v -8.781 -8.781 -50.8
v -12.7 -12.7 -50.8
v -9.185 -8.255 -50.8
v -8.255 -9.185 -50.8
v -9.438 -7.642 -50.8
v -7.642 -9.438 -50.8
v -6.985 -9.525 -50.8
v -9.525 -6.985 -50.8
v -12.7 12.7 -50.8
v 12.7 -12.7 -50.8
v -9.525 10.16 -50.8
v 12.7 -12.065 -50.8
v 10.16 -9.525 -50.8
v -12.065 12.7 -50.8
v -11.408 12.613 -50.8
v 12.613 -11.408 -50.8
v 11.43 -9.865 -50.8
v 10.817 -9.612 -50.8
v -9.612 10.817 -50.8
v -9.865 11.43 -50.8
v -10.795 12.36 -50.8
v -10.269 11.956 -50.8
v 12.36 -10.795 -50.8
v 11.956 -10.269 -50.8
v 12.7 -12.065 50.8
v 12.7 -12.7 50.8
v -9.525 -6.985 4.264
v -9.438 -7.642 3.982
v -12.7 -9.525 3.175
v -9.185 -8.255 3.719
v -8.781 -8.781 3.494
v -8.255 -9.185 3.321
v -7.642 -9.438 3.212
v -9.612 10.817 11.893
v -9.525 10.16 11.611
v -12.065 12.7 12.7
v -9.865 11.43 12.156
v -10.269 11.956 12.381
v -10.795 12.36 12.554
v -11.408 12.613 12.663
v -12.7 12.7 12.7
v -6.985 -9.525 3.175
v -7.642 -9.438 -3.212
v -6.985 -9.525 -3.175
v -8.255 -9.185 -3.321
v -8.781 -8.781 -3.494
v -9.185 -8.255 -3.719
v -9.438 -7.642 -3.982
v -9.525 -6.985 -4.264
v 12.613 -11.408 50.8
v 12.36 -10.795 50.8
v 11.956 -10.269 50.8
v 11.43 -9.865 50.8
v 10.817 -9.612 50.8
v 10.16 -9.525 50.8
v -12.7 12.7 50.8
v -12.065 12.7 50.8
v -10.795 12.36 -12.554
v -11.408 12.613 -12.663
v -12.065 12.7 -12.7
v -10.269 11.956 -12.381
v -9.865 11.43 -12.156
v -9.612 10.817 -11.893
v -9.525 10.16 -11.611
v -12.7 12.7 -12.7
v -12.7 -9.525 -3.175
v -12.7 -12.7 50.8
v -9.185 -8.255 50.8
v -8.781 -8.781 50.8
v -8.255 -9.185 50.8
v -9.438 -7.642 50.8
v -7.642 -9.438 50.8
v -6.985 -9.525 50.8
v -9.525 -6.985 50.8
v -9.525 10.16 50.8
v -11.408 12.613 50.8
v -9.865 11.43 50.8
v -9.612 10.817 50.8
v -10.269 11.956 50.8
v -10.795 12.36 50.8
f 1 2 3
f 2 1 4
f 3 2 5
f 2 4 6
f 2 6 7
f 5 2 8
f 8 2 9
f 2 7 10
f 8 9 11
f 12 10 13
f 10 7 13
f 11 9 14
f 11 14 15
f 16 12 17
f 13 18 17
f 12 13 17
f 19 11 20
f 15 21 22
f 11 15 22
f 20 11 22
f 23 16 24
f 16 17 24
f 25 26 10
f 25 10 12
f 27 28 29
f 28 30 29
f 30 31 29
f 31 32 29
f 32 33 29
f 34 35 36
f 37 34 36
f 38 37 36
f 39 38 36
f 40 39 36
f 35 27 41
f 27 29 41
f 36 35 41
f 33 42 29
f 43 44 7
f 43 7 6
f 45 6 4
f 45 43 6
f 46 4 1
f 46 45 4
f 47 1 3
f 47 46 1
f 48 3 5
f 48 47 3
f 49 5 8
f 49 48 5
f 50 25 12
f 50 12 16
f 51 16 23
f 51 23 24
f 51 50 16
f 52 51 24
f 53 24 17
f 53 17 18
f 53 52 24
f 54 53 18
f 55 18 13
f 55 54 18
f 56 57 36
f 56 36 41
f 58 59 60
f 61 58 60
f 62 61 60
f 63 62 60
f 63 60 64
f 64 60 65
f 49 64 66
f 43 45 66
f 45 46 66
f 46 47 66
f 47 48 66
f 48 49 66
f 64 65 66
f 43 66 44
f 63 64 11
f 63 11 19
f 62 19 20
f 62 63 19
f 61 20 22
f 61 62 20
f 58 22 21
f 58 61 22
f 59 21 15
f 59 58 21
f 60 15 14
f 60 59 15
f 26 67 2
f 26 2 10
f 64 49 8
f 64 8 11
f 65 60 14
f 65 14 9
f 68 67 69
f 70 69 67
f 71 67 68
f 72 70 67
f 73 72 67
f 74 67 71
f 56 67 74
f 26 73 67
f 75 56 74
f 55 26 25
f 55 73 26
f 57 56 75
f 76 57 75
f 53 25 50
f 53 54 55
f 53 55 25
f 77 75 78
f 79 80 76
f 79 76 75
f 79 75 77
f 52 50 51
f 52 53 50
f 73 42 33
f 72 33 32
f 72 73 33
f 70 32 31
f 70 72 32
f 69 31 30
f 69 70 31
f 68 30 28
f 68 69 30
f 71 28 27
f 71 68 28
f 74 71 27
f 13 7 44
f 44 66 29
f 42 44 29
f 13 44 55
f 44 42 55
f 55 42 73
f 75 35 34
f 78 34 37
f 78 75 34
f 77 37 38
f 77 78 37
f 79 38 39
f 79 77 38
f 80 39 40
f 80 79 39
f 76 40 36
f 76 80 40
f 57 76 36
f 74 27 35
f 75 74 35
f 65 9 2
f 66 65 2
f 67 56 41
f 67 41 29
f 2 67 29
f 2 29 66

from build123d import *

# Parameters (mm, degrees)
BOSS_EXTRUDE1_DEPTH = 50.8
CUT_EXTRUDE1_DEPTH  = 59.198711326


with BuildPart() as part:
    # Sketch1 → Boss-Extrude1 (new, symmetric)
    with BuildSketch(Plane.XY):
        with BuildLine():
            Line((-12.7, 12.7), (-12.7, -12.7))
            Line((-12.7, -12.7), (12.7, -12.7))
            Line((12.7, -12.7), (12.7, -12.065))
            ThreePointArc((12.7, -12.065), (11.956051224, -10.268948776), (10.16, -9.525))
            Line((10.16, -9.525), (-6.985, -9.525))
            ThreePointArc((-6.985, -9.525), (-8.781051224, -8.781051224), (-9.525, -6.985))
            Line((-9.525, -6.985), (-9.525, 10.16))
            ThreePointArc((-9.525, 10.16), (-10.268948776, 11.956051224), (-12.065, 12.7))
            Line((-12.065, 12.7), (-12.7, 12.7))
        make_face()
    extrude(amount=BOSS_EXTRUDE1_DEPTH, both=True)

    # Sketch3 → Cut-Extrude1 (cut, through all)
    with BuildSketch(Plane.ZY.offset(12.7)):
        Polygon((-12.7, 12.7), (-3.175, -9.525), (3.175, -9.525), (12.7, 12.7), align=None)
    extrude(amount=-CUT_EXTRUDE1_DEPTH, mode=Mode.SUBTRACT)


solid = part.part
